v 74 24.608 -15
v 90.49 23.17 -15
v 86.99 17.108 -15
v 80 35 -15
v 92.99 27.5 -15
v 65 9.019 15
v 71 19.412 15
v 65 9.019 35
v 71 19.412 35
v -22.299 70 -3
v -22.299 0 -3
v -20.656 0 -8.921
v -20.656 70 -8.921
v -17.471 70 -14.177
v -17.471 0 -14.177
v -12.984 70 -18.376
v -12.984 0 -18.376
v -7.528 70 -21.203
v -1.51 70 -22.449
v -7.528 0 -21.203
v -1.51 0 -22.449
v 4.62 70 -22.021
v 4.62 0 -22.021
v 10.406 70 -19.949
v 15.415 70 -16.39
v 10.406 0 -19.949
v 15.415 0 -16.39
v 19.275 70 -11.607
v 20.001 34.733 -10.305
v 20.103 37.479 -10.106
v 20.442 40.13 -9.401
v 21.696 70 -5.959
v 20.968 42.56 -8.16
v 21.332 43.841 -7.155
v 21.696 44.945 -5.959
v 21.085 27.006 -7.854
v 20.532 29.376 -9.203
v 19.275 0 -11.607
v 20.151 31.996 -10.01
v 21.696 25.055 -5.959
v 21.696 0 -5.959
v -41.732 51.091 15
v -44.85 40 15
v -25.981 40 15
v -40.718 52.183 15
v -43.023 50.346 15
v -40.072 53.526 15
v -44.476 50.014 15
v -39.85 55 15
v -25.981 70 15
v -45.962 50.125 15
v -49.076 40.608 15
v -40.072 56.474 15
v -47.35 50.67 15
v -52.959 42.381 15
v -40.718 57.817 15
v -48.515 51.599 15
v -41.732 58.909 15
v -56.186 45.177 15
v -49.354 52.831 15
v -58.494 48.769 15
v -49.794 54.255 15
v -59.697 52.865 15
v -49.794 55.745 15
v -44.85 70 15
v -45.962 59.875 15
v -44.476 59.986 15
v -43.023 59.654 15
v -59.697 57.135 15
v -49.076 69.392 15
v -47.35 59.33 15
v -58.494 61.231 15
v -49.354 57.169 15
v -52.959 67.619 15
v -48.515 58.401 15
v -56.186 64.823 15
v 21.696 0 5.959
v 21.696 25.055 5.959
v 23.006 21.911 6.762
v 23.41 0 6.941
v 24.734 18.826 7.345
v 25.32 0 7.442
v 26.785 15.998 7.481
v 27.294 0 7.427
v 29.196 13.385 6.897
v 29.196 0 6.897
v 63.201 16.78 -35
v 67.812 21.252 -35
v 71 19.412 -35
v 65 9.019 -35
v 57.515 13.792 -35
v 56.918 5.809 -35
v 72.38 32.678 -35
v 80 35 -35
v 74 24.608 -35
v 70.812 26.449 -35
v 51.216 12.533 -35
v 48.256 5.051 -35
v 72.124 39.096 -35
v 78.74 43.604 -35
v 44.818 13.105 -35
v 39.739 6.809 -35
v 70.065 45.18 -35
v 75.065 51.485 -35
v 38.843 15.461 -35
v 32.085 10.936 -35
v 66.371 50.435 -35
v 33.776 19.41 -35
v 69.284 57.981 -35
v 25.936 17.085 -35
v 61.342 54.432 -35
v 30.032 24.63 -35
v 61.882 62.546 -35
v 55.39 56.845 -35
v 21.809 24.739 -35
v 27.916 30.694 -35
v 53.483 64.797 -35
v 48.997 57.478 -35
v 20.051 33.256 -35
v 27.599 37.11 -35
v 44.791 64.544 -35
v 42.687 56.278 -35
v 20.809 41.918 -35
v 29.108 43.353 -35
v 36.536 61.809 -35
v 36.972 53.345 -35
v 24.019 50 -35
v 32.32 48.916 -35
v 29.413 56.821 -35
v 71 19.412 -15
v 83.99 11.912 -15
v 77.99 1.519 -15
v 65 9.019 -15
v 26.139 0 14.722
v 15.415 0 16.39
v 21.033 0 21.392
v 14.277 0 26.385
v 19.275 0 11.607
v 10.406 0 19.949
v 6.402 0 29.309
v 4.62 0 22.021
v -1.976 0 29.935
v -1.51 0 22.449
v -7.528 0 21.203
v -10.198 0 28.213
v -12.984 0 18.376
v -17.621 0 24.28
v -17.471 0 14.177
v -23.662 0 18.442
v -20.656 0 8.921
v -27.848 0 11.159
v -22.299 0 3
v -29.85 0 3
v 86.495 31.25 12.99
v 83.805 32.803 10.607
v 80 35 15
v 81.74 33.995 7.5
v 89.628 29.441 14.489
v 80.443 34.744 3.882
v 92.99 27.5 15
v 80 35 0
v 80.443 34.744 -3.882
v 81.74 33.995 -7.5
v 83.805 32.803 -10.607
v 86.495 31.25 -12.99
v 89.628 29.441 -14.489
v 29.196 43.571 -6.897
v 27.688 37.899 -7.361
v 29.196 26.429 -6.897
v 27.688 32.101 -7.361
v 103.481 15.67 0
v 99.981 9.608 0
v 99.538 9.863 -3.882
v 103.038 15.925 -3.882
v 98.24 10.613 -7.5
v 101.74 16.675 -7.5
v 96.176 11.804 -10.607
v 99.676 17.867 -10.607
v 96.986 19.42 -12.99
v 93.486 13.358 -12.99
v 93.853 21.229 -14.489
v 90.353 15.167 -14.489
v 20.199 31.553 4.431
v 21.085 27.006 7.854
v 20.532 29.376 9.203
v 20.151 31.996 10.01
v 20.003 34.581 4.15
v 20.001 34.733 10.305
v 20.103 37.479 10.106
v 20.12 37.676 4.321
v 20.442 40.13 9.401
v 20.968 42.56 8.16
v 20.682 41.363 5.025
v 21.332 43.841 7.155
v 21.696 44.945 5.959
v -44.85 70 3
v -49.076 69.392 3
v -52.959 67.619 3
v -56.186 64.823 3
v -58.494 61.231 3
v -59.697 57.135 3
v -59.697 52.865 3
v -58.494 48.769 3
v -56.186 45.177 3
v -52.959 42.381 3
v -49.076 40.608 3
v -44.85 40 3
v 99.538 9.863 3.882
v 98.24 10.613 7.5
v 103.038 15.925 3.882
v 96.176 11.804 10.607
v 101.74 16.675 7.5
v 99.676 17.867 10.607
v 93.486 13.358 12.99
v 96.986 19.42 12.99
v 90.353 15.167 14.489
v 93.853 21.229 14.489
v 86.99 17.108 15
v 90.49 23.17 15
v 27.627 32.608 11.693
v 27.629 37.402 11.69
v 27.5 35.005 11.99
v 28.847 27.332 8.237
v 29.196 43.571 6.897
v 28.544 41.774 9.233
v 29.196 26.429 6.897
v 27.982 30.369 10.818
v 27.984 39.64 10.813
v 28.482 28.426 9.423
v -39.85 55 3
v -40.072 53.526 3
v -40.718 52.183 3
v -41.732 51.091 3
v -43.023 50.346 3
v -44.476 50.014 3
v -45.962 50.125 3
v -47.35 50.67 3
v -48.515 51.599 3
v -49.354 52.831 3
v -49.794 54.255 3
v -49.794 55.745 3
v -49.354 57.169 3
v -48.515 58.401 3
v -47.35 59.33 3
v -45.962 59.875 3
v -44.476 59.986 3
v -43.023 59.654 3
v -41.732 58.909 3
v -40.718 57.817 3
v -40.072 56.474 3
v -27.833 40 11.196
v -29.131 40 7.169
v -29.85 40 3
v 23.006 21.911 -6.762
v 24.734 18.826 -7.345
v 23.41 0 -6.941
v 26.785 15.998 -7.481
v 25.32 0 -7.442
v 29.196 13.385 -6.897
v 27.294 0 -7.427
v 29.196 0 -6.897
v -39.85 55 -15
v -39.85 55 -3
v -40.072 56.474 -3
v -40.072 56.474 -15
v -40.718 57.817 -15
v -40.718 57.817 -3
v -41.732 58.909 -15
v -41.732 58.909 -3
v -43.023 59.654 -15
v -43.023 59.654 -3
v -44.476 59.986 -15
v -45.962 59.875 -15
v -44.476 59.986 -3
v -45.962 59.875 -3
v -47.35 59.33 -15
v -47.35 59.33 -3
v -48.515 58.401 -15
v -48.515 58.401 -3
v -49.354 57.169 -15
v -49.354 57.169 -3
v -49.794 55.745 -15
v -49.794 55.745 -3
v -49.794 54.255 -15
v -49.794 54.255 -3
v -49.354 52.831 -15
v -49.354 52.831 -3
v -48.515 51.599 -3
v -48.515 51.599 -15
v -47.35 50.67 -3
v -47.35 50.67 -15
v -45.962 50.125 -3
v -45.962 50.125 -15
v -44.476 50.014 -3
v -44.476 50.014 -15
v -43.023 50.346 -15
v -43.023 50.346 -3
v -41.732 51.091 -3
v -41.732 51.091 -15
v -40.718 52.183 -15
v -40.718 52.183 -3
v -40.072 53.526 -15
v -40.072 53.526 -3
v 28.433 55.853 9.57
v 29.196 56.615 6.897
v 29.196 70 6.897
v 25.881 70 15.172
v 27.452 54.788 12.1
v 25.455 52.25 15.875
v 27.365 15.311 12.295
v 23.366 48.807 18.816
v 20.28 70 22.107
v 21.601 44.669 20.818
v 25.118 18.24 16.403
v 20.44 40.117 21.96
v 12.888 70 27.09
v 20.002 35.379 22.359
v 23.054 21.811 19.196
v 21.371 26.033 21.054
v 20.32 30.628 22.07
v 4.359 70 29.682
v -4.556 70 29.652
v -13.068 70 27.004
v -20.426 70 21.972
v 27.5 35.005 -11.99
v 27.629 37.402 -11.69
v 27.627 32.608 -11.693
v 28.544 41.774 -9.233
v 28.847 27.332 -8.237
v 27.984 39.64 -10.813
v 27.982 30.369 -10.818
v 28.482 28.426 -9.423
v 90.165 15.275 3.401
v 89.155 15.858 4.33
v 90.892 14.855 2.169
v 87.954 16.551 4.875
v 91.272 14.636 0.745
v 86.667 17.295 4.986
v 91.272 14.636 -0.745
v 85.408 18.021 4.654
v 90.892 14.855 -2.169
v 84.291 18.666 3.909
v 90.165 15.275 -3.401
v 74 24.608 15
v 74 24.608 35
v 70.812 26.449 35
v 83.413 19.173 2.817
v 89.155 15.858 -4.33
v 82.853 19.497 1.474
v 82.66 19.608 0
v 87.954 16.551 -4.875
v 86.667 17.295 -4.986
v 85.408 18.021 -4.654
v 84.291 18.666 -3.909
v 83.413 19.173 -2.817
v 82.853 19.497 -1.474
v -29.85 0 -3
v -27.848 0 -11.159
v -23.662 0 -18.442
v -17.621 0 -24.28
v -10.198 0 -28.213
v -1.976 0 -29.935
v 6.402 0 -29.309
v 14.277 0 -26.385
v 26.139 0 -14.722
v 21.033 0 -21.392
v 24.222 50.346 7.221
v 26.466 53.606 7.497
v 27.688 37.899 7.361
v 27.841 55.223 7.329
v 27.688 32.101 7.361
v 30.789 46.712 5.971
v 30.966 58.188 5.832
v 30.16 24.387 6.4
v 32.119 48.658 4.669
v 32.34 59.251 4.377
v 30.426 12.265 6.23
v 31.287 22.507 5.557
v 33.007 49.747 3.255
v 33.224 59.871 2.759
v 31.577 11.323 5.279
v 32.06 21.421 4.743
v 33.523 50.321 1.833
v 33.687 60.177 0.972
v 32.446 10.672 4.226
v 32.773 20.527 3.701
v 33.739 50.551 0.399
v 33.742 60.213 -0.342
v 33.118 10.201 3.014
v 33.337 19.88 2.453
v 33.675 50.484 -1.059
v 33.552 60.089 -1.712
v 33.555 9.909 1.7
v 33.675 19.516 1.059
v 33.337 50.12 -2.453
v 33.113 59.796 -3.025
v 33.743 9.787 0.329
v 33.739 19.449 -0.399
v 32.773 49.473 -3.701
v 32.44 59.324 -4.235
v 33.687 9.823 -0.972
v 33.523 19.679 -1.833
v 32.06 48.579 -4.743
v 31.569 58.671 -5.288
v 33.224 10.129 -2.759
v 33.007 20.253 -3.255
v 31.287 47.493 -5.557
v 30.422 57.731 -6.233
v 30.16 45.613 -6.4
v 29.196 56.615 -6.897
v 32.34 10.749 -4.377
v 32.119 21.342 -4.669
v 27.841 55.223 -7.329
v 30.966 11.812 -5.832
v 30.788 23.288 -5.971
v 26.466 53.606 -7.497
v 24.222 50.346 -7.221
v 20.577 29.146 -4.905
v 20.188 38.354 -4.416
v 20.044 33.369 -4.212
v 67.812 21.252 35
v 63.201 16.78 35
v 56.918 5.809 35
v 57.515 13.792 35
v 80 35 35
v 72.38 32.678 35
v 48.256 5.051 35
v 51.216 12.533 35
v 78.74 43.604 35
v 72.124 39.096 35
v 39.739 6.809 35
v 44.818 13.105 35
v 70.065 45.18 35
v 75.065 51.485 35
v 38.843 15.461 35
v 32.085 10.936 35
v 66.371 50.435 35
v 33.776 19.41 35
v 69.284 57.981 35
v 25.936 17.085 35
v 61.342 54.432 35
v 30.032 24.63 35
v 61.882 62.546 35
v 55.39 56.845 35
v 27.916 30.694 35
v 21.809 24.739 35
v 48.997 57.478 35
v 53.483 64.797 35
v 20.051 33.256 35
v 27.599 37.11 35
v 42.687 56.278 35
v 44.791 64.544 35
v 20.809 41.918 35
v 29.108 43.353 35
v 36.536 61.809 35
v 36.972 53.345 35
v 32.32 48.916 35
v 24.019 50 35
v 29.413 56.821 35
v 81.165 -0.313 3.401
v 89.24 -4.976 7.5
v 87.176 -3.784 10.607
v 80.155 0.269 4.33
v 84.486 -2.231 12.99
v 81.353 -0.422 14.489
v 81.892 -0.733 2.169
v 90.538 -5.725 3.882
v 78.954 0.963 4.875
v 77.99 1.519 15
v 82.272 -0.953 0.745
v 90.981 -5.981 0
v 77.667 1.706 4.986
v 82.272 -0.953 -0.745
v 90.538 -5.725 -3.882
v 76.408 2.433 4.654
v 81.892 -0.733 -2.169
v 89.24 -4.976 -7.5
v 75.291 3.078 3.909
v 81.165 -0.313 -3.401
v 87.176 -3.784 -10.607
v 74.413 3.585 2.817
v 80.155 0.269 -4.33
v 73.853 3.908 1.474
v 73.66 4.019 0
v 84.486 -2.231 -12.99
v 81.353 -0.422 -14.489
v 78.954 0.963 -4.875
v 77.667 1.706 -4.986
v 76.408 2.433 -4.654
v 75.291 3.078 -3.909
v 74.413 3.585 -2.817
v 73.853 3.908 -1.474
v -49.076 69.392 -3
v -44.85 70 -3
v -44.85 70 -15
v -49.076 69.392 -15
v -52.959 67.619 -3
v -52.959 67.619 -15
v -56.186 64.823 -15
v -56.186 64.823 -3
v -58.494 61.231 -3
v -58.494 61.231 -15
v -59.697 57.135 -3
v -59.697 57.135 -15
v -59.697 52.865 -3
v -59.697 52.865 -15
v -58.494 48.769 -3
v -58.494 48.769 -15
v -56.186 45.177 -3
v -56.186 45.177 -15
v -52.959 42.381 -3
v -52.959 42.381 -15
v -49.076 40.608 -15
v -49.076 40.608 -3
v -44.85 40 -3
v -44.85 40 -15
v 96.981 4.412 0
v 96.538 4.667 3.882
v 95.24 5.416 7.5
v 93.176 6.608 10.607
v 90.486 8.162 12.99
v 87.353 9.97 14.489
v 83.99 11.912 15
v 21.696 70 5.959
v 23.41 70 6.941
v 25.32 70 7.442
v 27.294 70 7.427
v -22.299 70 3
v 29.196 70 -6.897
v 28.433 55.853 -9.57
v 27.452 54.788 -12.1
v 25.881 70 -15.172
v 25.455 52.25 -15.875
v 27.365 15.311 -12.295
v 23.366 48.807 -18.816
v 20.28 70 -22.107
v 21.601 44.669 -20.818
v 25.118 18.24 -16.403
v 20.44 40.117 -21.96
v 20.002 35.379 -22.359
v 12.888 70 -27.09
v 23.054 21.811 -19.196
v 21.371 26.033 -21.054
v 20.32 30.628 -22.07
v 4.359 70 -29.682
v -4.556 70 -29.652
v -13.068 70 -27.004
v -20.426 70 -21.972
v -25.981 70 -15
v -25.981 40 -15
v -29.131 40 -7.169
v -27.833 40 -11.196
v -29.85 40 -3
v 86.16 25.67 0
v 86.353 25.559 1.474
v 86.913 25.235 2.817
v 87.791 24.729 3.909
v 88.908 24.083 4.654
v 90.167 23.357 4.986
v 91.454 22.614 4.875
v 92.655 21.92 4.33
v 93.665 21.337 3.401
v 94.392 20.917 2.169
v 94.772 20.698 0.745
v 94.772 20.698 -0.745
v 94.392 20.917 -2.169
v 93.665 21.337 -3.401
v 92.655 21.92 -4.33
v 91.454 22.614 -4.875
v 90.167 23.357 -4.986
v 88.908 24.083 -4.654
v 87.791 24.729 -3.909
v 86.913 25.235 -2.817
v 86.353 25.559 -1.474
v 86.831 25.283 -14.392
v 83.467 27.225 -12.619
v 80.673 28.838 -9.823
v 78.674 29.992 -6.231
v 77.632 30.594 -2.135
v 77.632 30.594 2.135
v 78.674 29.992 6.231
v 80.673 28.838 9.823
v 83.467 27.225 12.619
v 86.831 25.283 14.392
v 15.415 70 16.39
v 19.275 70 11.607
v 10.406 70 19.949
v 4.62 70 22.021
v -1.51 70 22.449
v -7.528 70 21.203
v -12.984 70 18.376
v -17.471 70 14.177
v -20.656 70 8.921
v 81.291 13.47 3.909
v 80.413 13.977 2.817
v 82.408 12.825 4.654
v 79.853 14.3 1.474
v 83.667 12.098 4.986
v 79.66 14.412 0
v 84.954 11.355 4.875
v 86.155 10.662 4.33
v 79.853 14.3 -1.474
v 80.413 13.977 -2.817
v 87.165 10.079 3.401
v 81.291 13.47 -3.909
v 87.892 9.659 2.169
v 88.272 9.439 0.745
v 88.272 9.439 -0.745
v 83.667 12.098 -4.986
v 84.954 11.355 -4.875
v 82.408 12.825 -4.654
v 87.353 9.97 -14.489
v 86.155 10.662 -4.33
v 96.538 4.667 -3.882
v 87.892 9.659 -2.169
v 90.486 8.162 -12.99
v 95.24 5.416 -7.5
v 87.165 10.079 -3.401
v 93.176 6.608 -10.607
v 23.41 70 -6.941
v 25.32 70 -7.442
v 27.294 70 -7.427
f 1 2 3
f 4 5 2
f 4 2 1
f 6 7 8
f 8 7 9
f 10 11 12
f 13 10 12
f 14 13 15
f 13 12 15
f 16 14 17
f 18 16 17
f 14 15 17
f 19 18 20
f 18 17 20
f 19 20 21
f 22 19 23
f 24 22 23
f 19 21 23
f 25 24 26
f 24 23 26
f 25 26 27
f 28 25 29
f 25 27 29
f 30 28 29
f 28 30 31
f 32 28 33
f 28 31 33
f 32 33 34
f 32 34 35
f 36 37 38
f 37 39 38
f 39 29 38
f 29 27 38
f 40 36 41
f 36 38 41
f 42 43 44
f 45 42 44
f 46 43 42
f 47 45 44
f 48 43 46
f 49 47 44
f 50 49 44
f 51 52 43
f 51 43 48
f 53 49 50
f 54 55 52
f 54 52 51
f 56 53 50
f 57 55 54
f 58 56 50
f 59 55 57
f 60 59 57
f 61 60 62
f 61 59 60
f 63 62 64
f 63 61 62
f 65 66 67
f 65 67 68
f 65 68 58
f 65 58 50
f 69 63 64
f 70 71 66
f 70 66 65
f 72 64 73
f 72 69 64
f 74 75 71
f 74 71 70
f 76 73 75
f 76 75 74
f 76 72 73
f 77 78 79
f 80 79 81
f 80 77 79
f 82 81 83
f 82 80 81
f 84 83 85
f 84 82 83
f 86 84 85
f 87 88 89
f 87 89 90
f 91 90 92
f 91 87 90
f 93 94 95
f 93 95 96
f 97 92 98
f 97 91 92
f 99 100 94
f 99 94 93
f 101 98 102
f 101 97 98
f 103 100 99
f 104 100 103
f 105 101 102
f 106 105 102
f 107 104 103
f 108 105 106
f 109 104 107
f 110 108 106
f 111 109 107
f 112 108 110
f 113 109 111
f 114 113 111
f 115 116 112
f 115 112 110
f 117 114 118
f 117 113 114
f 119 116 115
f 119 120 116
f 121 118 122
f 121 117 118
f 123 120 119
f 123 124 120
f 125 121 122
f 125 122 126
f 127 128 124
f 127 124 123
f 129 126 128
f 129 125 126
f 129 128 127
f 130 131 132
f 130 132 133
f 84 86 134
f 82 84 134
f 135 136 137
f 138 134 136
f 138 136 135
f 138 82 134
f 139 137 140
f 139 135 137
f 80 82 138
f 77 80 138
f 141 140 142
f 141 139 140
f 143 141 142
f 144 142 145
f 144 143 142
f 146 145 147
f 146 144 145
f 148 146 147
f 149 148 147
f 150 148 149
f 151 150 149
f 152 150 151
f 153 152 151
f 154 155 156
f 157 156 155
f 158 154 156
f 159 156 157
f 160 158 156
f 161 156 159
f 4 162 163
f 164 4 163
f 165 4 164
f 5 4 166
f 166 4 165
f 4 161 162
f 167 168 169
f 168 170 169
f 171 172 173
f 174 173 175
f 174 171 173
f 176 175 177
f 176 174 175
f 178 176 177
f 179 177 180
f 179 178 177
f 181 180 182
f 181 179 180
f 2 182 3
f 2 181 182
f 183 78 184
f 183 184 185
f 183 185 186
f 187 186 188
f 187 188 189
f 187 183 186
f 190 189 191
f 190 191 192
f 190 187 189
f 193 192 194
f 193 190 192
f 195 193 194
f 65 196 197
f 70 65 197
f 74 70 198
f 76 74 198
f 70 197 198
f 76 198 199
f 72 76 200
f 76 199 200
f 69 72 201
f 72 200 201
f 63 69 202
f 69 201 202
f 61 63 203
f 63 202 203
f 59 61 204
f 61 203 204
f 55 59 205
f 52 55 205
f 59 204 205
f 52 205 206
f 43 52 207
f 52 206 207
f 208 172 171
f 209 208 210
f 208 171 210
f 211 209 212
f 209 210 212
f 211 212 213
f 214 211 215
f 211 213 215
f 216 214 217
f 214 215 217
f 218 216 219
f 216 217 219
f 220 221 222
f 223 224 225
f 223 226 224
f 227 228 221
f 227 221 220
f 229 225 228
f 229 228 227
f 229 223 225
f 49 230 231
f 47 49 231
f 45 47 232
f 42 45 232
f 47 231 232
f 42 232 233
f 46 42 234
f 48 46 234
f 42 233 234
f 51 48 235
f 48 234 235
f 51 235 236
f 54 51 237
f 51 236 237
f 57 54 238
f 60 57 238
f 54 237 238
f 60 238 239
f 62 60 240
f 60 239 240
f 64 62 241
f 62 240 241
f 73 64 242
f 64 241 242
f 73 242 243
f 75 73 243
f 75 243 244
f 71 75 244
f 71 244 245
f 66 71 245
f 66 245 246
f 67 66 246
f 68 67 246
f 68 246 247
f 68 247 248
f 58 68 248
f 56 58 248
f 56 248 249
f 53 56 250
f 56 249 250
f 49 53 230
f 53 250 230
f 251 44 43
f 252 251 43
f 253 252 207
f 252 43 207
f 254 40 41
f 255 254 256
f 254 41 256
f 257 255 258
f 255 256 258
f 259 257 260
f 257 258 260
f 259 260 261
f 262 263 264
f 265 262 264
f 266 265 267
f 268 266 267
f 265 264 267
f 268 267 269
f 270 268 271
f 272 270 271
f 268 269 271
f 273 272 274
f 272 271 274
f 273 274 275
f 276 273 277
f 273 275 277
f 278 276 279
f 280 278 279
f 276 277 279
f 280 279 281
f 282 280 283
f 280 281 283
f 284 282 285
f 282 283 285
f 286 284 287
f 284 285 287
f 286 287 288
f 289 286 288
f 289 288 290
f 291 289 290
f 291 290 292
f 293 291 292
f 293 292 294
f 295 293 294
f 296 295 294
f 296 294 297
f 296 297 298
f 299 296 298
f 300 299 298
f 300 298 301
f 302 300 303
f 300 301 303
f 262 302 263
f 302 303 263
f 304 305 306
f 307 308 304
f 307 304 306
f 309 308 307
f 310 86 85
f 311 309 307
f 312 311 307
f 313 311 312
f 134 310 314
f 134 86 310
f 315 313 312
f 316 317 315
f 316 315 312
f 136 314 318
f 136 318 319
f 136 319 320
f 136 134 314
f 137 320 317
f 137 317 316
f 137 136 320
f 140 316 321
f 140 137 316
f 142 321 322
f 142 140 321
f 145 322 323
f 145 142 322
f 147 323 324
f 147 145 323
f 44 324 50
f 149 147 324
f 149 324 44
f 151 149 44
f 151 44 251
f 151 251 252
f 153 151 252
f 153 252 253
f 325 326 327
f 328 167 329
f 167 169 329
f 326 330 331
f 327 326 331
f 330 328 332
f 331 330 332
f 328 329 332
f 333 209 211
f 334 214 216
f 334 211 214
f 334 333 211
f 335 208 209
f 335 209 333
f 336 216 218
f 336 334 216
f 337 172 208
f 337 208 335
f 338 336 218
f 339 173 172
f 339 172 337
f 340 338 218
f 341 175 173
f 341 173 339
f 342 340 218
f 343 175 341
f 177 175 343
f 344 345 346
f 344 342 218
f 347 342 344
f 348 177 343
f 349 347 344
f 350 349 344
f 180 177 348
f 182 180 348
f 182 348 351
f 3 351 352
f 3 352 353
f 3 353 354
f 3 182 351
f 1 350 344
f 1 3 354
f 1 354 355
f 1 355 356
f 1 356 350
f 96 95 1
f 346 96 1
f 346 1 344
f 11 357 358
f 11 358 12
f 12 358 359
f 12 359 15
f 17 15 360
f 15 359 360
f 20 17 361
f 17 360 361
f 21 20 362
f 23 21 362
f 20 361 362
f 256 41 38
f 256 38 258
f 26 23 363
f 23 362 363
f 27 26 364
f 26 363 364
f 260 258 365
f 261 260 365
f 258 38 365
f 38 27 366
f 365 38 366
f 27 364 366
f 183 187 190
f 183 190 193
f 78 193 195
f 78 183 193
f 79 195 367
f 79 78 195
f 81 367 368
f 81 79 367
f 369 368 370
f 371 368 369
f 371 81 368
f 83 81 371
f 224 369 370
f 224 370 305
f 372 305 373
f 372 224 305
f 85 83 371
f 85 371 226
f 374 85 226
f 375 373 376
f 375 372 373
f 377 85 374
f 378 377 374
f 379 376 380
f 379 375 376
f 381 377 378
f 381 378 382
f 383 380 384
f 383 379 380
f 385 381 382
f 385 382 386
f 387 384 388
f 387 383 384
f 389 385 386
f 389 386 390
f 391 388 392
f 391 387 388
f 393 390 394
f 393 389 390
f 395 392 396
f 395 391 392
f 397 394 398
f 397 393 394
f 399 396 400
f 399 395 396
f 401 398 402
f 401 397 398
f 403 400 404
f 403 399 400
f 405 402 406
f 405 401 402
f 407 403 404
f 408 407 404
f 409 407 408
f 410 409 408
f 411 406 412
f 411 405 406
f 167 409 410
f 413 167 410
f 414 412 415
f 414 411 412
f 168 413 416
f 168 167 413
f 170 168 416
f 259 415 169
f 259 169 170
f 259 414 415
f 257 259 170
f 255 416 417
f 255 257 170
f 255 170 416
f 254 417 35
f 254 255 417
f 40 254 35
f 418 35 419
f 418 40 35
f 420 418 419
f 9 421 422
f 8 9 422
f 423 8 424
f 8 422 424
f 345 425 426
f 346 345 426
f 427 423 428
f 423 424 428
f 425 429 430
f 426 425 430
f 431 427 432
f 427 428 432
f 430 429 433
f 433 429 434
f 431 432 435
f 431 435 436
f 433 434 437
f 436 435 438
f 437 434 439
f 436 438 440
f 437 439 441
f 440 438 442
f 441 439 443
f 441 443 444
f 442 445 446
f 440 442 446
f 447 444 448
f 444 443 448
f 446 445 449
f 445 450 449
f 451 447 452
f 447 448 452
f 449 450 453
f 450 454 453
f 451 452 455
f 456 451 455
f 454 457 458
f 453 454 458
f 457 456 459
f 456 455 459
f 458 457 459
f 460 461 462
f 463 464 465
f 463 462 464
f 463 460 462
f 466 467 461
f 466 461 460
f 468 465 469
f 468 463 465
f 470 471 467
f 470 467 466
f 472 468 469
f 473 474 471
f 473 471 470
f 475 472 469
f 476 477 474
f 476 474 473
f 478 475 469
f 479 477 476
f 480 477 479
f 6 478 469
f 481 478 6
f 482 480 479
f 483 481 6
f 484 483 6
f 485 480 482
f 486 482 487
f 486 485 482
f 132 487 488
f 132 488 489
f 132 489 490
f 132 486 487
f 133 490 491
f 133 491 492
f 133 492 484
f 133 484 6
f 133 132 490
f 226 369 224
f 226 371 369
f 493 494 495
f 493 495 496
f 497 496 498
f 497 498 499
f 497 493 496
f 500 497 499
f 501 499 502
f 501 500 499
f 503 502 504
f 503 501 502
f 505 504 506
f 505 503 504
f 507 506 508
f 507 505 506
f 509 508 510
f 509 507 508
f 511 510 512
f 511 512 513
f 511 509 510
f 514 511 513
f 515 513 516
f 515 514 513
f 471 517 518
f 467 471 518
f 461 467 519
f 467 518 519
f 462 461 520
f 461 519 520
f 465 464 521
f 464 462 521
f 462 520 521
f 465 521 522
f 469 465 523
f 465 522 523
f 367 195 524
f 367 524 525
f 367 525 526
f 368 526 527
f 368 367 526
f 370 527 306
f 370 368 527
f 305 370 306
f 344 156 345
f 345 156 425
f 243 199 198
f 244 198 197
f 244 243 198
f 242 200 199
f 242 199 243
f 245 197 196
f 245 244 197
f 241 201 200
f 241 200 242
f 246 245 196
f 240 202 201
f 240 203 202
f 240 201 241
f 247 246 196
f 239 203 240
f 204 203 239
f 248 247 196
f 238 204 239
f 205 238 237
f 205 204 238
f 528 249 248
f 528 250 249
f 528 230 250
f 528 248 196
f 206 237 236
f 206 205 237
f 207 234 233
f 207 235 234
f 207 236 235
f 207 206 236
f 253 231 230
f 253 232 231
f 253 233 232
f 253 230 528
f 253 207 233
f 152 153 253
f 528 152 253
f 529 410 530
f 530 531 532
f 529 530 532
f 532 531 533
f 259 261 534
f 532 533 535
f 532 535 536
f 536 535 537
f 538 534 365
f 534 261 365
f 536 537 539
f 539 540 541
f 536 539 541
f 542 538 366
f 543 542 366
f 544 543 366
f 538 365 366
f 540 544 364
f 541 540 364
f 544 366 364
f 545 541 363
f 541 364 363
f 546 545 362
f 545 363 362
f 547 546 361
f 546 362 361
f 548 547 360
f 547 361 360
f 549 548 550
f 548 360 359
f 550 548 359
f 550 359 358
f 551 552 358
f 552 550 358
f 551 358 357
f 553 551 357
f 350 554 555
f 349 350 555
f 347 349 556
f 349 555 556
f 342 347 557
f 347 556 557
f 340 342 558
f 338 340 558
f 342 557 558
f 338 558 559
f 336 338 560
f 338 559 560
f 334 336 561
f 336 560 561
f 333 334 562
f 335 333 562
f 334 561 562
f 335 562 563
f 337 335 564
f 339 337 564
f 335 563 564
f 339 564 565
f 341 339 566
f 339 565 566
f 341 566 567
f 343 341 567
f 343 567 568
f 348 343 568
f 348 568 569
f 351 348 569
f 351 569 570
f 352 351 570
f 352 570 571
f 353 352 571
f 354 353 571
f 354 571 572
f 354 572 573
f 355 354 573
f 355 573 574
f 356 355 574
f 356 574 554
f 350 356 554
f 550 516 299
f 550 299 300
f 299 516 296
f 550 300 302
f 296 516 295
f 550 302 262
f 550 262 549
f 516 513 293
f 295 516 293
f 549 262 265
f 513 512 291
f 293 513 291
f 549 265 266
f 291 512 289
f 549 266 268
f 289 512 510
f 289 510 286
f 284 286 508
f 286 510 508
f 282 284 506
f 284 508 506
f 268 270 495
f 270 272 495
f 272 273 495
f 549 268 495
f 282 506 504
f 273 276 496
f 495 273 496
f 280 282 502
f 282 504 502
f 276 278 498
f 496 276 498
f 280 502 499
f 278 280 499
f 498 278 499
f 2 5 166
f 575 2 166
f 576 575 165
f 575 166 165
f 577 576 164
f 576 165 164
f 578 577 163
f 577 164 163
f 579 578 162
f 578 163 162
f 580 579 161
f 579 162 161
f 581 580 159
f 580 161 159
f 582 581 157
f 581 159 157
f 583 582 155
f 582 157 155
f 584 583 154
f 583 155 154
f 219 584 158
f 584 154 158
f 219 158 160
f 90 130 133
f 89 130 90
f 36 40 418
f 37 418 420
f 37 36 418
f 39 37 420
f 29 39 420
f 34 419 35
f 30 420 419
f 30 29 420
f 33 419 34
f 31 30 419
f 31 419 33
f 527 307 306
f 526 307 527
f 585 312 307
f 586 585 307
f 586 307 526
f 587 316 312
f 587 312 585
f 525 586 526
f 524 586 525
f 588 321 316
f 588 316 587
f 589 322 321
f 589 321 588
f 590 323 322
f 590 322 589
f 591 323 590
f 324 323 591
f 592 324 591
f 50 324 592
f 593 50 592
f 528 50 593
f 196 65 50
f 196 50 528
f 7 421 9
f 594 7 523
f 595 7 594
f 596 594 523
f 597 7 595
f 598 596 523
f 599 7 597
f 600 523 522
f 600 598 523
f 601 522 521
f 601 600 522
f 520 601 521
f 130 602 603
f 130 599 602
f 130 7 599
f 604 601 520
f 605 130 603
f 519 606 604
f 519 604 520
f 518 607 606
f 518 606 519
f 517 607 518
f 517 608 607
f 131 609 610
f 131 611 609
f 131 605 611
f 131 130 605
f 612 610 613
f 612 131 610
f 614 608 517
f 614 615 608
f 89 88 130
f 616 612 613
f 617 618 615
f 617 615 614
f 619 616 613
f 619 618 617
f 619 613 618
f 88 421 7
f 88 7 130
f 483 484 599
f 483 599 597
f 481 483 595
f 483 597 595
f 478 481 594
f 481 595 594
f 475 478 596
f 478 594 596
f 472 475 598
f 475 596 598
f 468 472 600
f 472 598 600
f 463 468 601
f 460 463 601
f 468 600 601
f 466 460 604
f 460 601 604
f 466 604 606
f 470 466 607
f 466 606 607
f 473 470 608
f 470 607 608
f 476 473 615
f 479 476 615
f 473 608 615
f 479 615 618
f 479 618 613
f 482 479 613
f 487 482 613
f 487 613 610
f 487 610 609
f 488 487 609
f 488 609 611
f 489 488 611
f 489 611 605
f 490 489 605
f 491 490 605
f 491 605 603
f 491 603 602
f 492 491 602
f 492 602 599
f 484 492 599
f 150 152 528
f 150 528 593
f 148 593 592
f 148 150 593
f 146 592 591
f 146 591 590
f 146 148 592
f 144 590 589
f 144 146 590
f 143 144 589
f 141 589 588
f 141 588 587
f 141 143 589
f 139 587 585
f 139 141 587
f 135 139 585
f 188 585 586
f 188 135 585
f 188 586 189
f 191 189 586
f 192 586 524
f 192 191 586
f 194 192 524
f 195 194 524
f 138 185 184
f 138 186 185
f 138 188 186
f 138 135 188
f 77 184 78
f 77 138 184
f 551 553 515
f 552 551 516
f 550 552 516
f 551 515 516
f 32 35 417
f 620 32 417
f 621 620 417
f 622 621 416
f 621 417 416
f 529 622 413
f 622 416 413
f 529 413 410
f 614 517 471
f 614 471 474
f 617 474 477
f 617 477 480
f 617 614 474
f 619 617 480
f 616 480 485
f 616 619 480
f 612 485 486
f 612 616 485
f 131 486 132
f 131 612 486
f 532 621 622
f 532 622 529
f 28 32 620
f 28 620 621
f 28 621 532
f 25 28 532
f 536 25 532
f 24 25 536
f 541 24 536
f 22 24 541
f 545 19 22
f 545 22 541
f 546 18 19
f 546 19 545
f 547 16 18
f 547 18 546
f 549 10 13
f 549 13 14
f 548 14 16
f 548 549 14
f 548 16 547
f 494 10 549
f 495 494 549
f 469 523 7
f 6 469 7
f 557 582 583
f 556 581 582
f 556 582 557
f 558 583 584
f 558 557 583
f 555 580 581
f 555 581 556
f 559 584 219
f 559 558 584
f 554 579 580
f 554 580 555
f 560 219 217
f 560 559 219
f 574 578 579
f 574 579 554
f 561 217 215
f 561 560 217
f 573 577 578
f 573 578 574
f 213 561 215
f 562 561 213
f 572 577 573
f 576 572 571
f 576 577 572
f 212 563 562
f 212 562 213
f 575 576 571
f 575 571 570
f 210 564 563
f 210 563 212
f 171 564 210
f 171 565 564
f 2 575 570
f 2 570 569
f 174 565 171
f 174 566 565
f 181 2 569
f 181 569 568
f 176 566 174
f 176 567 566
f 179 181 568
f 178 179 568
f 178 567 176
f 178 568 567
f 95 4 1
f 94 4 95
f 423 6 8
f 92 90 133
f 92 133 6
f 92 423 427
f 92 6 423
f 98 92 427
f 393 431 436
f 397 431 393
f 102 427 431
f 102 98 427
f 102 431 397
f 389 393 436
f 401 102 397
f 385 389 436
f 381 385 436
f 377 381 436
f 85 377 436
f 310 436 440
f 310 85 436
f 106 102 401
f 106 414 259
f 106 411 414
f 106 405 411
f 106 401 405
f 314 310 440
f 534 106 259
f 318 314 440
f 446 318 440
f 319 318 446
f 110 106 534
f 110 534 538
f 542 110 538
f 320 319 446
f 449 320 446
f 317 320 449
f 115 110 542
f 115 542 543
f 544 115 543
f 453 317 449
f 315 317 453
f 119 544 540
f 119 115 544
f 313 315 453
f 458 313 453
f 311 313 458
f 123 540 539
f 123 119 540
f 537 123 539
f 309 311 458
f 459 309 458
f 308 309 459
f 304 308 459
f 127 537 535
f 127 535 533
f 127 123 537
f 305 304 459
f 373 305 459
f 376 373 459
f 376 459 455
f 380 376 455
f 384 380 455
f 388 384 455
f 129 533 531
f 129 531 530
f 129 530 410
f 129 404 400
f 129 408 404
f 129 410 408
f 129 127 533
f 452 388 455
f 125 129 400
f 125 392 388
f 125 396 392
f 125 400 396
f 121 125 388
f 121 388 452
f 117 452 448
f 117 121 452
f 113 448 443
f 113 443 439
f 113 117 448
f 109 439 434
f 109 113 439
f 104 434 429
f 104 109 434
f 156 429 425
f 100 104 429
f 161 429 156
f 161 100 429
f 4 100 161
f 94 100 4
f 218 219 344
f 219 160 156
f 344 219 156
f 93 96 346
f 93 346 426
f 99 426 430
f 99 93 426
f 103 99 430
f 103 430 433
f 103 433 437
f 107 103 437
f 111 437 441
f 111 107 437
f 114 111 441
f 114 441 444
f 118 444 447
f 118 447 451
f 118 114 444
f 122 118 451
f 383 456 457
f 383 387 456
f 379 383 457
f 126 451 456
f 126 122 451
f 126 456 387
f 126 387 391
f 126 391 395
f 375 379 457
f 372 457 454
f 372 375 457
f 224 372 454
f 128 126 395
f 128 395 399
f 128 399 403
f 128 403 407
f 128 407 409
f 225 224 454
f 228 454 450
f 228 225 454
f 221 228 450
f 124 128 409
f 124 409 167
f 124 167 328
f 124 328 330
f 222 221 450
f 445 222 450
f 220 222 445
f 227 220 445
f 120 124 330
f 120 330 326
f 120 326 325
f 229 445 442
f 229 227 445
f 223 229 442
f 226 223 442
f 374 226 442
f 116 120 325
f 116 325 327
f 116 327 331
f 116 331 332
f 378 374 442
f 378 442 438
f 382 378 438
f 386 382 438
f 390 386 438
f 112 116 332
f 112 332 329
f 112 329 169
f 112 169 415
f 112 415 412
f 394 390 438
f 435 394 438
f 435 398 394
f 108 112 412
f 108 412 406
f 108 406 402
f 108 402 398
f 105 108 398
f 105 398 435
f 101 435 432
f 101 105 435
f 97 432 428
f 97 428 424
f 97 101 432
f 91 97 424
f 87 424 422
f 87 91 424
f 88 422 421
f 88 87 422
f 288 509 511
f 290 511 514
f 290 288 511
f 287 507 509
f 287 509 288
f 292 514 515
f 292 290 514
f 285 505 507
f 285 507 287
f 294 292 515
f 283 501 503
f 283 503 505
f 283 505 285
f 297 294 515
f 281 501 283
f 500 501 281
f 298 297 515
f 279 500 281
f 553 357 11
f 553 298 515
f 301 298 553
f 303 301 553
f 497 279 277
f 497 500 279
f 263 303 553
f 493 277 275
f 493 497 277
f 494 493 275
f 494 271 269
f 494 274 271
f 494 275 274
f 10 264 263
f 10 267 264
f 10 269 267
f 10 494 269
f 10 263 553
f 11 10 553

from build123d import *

# Parameters (mm, degrees)
BOSS_EXTRUDE1_DEPTH      = 70
BOSS_EXTRUDE1_2_DEPTH    = 70
SKETCH3_R                = 5
BOSS_EXTRUDE3_DEPTH      = 12
SKETCH4_R                = 5
BOSS_EXTRUDE4_DEPTH      = 12
BOSS_EXTRUDE5_REACH      = 98.366
SKETCH5_W                = 12
SKETCH5_H                = 30
BOSS_EXTRUDE6_REACH      = 98.366
SKETCH6_W                = 12
SKETCH6_H                = 30
BOSS_EXTRUDE7_DEPTH      = 35
BOSS_EXTRUDE7_DEPTH_BACK = 35
SKETCH8_R                = 7.5
CUT_EXTRUDE1_DEPTH       = 132.745671501
CUT_EXTRUDE4_DEPTH       = 122.337535907
CUT_EXTRUDE5_DEPTH       = 122.337535907
SKETCH12_R               = 15
CUT_EXTRUDE6_DEPTH       = 5
SKETCH13_R               = 5
CUT_EXTRUDE7_DEPTH       = 118.019851709


with BuildPart() as part:
    # Sketch2 → Boss-Extrude1 (new body)
    with BuildSketch(Plane(origin=(0, 0, 0), x_dir=(1, 0, 0), z_dir=(0, 1, 0))):
        with BuildLine():
            Line((-29.849623113, 3), (-22.299103121, 3))
            ThreePointArc((-22.299103121, 3), (-1.510093754, 22.449267624), (21.696428571, 5.959445213))
            ThreePointArc((21.696428571, 5.959445213), (25.319689527, 7.44207783), (29.196428571, 6.896996352))
            ThreePointArc((29.196428571, 6.896996352), (-1.975679862, 29.934874128), (-29.849623113, 3))
        make_face()
    extrude(amount=BOSS_EXTRUDE1_DEPTH)

    # Sketch6 → Boss-Extrude6 (add, up to next)
    with BuildSketch(Plane(origin=(-29.849623113, 0, 0), x_dir=(0, 0, -1), z_dir=(1, 0, 0)), mode=Mode.PRIVATE) as boss_extrude6_sk1:
        with Locations((9, 55)):
            Rectangle(SKETCH6_W, SKETCH6_H)
    boss_extrude6_tool1 = extrude(boss_extrude6_sk1.sketch, amount=BOSS_EXTRUDE6_REACH, mode=Mode.PRIVATE) - part.part


with BuildPart() as body_2:
    # Sketch2 → Boss-Extrude1 2 (new body)
    with BuildSketch(Plane(origin=(0, 0, 0), x_dir=(1, 0, 0), z_dir=(0, 1, 0))):
        with BuildLine():
            Line((-29.849623113, -3), (-22.299103121, -3))
            ThreePointArc((-22.299103121, -3), (-1.510093754, -22.449267624), (21.696428571, -5.959445213))
            ThreePointArc((21.696428571, -5.959445213), (25.319689527, -7.44207783), (29.196428571, -6.896996352))
            ThreePointArc((29.196428571, -6.896996352), (-1.975679862, -29.934874128), (-29.849623113, -3))
        make_face()
    extrude(amount=BOSS_EXTRUDE1_2_DEPTH)

    # Sketch5 → Boss-Extrude5 (add, up to next)
    with BuildSketch(Plane(origin=(-29.849623113, 0, 0), x_dir=(0, 0, -1), z_dir=(1, 0, 0)), mode=Mode.PRIVATE) as boss_extrude5_sk1:
        with Locations((-9, 55)):
            Rectangle(SKETCH5_W, SKETCH5_H)
    boss_extrude5_tool1 = extrude(boss_extrude5_sk1.sketch, amount=BOSS_EXTRUDE5_REACH, mode=Mode.PRIVATE) - body_2.part


with BuildPart() as body_3:
    # Sketch3 → Boss-Extrude3 (new body)
    with BuildSketch(Plane.XY.offset(-3)):
        with BuildLine():
            Line((-29.849623113, 70), (-44.849623113, 70))
            ThreePointArc((-44.849623113, 70), (-59.849623113, 55), (-44.849623113, 40))
            Line((-44.849623113, 40), (-29.849623113, 40))
            Line((-29.849623113, 40), (-29.849623113, 70))
        make_face()
        with Locations((-44.849623113, 55)):
            Circle(SKETCH3_R, mode=Mode.SUBTRACT)
    extrude(amount=-BOSS_EXTRUDE3_DEPTH)


with BuildPart() as body_4:
    # Sketch4 → Boss-Extrude4 (new body)
    with BuildSketch(Plane(origin=(0, 0, 3), x_dir=(-1, 0, 0), z_dir=(0, 0, -1))):
        with BuildLine():
            Line((29.849623113, 40), (29.849623113, 70))
            Line((29.849623113, 70), (44.849623113, 70))
            ThreePointArc((44.849623113, 70), (59.849623113, 55), (44.849623113, 40))
            Line((44.849623113, 40), (29.849623113, 40))
        make_face()
        with Locations(Location((44.849623113, 55, 0), (0, 0, 180))):
            Circle(SKETCH4_R, mode=Mode.SUBTRACT)
    extrude(amount=-BOSS_EXTRUDE4_DEPTH)


with BuildPart() as body_2_1:
    add(body_2.part)

    add(body_4.part)  # Boss-Extrude5 merges body 4
    add(boss_extrude5_tool1.solids().sort_by_distance((-29.849623, 55, 9))[0])


with BuildPart() as part_1:
    add(part.part)

    add(body_3.part)  # Boss-Extrude6 merges body 3
    add(boss_extrude6_tool1.solids().sort_by_distance((-29.849623, 55, -9))[0])


    add(body_2_1.part)  # Boss-Extrude7 merges body 2
    # Sketch7 → Boss-Extrude7 (add, two sides: drawn at the far end of the back side and taken through both)
    with BuildSketch(Plane.XY.offset(-BOSS_EXTRUDE7_DEPTH_BACK)):
        with BuildLine():
            Line((99.980762114, 9.607695155), (70.811589784, 26.448524651))
            ThreePointArc((70.811589784, 26.448524651), (30.514428415, 46.25), (67.811589784, 21.252372228))
            Line((67.811589784, 21.252372228), (96.980762114, 4.411542732))
            Line((96.980762114, 4.411542732), (90.980762114, -5.980762114))
            Line((90.980762114, -5.980762114), (65, 9.019237886))
            ThreePointArc((65, 9.019237886), (24.019237886, 50), (80, 35))
            Line((80, 35), (105.980762114, 20))
            Line((105.980762114, 20), (99.980762114, 9.607695155))
        make_face()
    extrude(amount=BOSS_EXTRUDE7_DEPTH + BOSS_EXTRUDE7_DEPTH_BACK)

    # Sketch8 → Cut-Extrude1 (cut, through all)
    with BuildSketch(Plane(origin=(0, 0, 0), x_dir=(1, 0, 0), z_dir=(0, 1, 0))):
        with Locations((26.25, 0)):
            Circle(SKETCH8_R)
    extrude(amount=CUT_EXTRUDE1_DEPTH, mode=Mode.SUBTRACT)

    # Sketch10 → Cut-Extrude4 (cut, through all)
    with BuildSketch(Plane(origin=(35.155444566, 60.891016151, 0), x_dir=(0.8660254037844384, -0.5000000000000007, 0), z_dir=(0.5000000000000006, 0.8660254037844383, 0))):
        with BuildLine():
            Line((66.782032303, 15), (51.782032303, 15))
            Line((51.782032303, 15), (51.782032303, 35))
            Line((51.782032303, 35), (81.782032303, 35))
            Line((81.782032303, 35), (81.782032303, 0))
            ThreePointArc((81.782032303, 0), (77.388634021, 10.606601718), (66.782032303, 15))
        make_face()
    extrude(amount=-CUT_EXTRUDE4_DEPTH, mode=Mode.SUBTRACT)

    # Sketch11 → Cut-Extrude5 (cut, through all)
    with BuildSketch(Plane(origin=(35.155444566, 60.891016151, 0), x_dir=(0.8660254037844384, -0.5000000000000007, 0), z_dir=(0.5000000000000006, 0.8660254037844383, 0))):
        with BuildLine():
            Line((66.782032303, -15), (51.782032303, -15))
            Line((51.782032303, -15), (51.782032303, -35))
            Line((51.782032303, -35), (81.782032303, -35))
            Line((81.782032303, -35), (81.782032303, 0))
            ThreePointArc((81.782032303, 0), (77.388634021, -10.606601718), (66.782032303, -15))
        make_face()
    extrude(amount=-CUT_EXTRUDE5_DEPTH, mode=Mode.SUBTRACT)

    # Sketch12 → Cut-Extrude6 (cut)
    with BuildSketch(Plane(origin=(35.155444566, 60.891016151, 0), x_dir=(0.8660254037844384, -0.5000000000000007, 0), z_dir=(0.5000000000000006, 0.8660254037844383, 0))):
        with Locations((66.782032303, 0)):
            Circle(SKETCH12_R)
    extrude(amount=-CUT_EXTRUDE6_DEPTH, mode=Mode.SUBTRACT)

    # Sketch13 → Cut-Extrude7 (cut, through all)
    with BuildSketch(Plane(origin=(32.655444566, 56.560889132, 0), x_dir=(0.8660254037844383, -0.5000000000000008, 0), z_dir=(0.5000000000000007, 0.8660254037844382, 0))):
        with Locations(Location((66.782032303, 0, 0), (0, 0, 180))):
            Circle(SKETCH13_R)
    extrude(amount=-CUT_EXTRUDE7_DEPTH, mode=Mode.SUBTRACT)


solid = part_1.part
